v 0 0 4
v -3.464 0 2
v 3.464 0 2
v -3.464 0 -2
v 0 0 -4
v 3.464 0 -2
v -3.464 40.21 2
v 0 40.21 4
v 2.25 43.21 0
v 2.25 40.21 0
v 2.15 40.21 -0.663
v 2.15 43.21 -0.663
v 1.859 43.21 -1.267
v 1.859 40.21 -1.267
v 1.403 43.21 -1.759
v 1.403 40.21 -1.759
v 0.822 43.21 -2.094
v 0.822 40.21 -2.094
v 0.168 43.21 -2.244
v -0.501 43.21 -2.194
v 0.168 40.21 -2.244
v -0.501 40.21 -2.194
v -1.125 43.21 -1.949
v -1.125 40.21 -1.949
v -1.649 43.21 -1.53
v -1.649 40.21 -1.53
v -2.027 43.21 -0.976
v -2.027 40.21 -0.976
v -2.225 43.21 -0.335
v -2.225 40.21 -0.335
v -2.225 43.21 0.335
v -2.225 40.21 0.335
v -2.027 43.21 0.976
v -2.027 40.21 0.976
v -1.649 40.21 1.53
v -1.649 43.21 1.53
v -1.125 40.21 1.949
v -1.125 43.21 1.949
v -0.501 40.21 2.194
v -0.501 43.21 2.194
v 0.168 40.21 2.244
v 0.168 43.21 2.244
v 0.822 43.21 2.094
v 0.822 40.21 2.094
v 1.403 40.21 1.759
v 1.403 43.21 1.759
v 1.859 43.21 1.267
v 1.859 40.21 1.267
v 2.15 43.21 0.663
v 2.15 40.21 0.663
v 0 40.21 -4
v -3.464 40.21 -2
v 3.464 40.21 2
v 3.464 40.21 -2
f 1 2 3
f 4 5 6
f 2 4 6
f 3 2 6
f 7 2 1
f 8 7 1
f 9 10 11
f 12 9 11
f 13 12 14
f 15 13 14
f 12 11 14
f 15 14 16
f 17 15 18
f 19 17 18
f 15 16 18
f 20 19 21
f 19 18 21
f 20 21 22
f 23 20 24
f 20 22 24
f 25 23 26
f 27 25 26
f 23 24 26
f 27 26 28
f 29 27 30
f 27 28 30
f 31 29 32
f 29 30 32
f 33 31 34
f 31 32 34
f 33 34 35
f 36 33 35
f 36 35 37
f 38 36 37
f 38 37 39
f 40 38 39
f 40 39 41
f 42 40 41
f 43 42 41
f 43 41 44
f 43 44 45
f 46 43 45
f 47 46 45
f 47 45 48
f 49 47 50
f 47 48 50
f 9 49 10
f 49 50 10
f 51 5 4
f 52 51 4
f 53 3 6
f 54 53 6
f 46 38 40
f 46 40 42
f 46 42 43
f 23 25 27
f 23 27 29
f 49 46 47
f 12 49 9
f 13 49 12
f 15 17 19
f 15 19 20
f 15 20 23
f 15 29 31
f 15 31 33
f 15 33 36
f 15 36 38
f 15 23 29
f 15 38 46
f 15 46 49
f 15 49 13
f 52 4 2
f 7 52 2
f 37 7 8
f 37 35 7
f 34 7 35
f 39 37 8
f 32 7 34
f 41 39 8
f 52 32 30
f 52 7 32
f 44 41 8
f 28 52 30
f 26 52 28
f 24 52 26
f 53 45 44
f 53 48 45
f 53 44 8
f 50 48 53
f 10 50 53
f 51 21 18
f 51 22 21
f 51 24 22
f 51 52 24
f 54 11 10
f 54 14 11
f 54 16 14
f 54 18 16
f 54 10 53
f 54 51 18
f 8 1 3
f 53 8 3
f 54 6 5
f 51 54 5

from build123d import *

# Parameters (mm, degrees)
BOSS_EXTRUDE1_DEPTH      = 40.21
SKETCH2_R                = 2.25
BOSS_EXTRUDE2_DEPTH      = 3
BOSS_EXTRUDE2_DEPTH_BACK = 30


with BuildPart() as part:
    # Sketch1 → Boss-Extrude1 (new body)
    with BuildSketch(Plane(origin=(0, 0, 0), x_dir=(1, 0, 0), z_dir=(0, 1, 0))):
        Polygon((0, -4), (3.464101615, -2), (3.464101615, 2), (0, 4), (-3.464101615, 2), (-3.464101615, -2), align=None)
    extrude(amount=BOSS_EXTRUDE1_DEPTH)

    # Sketch2 → Boss-Extrude2 (add, two sides)
    with BuildSketch(Plane(origin=(0, 40.21, 0), x_dir=(1, 0, 0), z_dir=(0, 1, 0))) as boss_extrude2_sk:
        Circle(SKETCH2_R)
    extrude(amount=BOSS_EXTRUDE2_DEPTH)
    extrude(boss_extrude2_sk.sketch, amount=-BOSS_EXTRUDE2_DEPTH_BACK)


solid = part.part
